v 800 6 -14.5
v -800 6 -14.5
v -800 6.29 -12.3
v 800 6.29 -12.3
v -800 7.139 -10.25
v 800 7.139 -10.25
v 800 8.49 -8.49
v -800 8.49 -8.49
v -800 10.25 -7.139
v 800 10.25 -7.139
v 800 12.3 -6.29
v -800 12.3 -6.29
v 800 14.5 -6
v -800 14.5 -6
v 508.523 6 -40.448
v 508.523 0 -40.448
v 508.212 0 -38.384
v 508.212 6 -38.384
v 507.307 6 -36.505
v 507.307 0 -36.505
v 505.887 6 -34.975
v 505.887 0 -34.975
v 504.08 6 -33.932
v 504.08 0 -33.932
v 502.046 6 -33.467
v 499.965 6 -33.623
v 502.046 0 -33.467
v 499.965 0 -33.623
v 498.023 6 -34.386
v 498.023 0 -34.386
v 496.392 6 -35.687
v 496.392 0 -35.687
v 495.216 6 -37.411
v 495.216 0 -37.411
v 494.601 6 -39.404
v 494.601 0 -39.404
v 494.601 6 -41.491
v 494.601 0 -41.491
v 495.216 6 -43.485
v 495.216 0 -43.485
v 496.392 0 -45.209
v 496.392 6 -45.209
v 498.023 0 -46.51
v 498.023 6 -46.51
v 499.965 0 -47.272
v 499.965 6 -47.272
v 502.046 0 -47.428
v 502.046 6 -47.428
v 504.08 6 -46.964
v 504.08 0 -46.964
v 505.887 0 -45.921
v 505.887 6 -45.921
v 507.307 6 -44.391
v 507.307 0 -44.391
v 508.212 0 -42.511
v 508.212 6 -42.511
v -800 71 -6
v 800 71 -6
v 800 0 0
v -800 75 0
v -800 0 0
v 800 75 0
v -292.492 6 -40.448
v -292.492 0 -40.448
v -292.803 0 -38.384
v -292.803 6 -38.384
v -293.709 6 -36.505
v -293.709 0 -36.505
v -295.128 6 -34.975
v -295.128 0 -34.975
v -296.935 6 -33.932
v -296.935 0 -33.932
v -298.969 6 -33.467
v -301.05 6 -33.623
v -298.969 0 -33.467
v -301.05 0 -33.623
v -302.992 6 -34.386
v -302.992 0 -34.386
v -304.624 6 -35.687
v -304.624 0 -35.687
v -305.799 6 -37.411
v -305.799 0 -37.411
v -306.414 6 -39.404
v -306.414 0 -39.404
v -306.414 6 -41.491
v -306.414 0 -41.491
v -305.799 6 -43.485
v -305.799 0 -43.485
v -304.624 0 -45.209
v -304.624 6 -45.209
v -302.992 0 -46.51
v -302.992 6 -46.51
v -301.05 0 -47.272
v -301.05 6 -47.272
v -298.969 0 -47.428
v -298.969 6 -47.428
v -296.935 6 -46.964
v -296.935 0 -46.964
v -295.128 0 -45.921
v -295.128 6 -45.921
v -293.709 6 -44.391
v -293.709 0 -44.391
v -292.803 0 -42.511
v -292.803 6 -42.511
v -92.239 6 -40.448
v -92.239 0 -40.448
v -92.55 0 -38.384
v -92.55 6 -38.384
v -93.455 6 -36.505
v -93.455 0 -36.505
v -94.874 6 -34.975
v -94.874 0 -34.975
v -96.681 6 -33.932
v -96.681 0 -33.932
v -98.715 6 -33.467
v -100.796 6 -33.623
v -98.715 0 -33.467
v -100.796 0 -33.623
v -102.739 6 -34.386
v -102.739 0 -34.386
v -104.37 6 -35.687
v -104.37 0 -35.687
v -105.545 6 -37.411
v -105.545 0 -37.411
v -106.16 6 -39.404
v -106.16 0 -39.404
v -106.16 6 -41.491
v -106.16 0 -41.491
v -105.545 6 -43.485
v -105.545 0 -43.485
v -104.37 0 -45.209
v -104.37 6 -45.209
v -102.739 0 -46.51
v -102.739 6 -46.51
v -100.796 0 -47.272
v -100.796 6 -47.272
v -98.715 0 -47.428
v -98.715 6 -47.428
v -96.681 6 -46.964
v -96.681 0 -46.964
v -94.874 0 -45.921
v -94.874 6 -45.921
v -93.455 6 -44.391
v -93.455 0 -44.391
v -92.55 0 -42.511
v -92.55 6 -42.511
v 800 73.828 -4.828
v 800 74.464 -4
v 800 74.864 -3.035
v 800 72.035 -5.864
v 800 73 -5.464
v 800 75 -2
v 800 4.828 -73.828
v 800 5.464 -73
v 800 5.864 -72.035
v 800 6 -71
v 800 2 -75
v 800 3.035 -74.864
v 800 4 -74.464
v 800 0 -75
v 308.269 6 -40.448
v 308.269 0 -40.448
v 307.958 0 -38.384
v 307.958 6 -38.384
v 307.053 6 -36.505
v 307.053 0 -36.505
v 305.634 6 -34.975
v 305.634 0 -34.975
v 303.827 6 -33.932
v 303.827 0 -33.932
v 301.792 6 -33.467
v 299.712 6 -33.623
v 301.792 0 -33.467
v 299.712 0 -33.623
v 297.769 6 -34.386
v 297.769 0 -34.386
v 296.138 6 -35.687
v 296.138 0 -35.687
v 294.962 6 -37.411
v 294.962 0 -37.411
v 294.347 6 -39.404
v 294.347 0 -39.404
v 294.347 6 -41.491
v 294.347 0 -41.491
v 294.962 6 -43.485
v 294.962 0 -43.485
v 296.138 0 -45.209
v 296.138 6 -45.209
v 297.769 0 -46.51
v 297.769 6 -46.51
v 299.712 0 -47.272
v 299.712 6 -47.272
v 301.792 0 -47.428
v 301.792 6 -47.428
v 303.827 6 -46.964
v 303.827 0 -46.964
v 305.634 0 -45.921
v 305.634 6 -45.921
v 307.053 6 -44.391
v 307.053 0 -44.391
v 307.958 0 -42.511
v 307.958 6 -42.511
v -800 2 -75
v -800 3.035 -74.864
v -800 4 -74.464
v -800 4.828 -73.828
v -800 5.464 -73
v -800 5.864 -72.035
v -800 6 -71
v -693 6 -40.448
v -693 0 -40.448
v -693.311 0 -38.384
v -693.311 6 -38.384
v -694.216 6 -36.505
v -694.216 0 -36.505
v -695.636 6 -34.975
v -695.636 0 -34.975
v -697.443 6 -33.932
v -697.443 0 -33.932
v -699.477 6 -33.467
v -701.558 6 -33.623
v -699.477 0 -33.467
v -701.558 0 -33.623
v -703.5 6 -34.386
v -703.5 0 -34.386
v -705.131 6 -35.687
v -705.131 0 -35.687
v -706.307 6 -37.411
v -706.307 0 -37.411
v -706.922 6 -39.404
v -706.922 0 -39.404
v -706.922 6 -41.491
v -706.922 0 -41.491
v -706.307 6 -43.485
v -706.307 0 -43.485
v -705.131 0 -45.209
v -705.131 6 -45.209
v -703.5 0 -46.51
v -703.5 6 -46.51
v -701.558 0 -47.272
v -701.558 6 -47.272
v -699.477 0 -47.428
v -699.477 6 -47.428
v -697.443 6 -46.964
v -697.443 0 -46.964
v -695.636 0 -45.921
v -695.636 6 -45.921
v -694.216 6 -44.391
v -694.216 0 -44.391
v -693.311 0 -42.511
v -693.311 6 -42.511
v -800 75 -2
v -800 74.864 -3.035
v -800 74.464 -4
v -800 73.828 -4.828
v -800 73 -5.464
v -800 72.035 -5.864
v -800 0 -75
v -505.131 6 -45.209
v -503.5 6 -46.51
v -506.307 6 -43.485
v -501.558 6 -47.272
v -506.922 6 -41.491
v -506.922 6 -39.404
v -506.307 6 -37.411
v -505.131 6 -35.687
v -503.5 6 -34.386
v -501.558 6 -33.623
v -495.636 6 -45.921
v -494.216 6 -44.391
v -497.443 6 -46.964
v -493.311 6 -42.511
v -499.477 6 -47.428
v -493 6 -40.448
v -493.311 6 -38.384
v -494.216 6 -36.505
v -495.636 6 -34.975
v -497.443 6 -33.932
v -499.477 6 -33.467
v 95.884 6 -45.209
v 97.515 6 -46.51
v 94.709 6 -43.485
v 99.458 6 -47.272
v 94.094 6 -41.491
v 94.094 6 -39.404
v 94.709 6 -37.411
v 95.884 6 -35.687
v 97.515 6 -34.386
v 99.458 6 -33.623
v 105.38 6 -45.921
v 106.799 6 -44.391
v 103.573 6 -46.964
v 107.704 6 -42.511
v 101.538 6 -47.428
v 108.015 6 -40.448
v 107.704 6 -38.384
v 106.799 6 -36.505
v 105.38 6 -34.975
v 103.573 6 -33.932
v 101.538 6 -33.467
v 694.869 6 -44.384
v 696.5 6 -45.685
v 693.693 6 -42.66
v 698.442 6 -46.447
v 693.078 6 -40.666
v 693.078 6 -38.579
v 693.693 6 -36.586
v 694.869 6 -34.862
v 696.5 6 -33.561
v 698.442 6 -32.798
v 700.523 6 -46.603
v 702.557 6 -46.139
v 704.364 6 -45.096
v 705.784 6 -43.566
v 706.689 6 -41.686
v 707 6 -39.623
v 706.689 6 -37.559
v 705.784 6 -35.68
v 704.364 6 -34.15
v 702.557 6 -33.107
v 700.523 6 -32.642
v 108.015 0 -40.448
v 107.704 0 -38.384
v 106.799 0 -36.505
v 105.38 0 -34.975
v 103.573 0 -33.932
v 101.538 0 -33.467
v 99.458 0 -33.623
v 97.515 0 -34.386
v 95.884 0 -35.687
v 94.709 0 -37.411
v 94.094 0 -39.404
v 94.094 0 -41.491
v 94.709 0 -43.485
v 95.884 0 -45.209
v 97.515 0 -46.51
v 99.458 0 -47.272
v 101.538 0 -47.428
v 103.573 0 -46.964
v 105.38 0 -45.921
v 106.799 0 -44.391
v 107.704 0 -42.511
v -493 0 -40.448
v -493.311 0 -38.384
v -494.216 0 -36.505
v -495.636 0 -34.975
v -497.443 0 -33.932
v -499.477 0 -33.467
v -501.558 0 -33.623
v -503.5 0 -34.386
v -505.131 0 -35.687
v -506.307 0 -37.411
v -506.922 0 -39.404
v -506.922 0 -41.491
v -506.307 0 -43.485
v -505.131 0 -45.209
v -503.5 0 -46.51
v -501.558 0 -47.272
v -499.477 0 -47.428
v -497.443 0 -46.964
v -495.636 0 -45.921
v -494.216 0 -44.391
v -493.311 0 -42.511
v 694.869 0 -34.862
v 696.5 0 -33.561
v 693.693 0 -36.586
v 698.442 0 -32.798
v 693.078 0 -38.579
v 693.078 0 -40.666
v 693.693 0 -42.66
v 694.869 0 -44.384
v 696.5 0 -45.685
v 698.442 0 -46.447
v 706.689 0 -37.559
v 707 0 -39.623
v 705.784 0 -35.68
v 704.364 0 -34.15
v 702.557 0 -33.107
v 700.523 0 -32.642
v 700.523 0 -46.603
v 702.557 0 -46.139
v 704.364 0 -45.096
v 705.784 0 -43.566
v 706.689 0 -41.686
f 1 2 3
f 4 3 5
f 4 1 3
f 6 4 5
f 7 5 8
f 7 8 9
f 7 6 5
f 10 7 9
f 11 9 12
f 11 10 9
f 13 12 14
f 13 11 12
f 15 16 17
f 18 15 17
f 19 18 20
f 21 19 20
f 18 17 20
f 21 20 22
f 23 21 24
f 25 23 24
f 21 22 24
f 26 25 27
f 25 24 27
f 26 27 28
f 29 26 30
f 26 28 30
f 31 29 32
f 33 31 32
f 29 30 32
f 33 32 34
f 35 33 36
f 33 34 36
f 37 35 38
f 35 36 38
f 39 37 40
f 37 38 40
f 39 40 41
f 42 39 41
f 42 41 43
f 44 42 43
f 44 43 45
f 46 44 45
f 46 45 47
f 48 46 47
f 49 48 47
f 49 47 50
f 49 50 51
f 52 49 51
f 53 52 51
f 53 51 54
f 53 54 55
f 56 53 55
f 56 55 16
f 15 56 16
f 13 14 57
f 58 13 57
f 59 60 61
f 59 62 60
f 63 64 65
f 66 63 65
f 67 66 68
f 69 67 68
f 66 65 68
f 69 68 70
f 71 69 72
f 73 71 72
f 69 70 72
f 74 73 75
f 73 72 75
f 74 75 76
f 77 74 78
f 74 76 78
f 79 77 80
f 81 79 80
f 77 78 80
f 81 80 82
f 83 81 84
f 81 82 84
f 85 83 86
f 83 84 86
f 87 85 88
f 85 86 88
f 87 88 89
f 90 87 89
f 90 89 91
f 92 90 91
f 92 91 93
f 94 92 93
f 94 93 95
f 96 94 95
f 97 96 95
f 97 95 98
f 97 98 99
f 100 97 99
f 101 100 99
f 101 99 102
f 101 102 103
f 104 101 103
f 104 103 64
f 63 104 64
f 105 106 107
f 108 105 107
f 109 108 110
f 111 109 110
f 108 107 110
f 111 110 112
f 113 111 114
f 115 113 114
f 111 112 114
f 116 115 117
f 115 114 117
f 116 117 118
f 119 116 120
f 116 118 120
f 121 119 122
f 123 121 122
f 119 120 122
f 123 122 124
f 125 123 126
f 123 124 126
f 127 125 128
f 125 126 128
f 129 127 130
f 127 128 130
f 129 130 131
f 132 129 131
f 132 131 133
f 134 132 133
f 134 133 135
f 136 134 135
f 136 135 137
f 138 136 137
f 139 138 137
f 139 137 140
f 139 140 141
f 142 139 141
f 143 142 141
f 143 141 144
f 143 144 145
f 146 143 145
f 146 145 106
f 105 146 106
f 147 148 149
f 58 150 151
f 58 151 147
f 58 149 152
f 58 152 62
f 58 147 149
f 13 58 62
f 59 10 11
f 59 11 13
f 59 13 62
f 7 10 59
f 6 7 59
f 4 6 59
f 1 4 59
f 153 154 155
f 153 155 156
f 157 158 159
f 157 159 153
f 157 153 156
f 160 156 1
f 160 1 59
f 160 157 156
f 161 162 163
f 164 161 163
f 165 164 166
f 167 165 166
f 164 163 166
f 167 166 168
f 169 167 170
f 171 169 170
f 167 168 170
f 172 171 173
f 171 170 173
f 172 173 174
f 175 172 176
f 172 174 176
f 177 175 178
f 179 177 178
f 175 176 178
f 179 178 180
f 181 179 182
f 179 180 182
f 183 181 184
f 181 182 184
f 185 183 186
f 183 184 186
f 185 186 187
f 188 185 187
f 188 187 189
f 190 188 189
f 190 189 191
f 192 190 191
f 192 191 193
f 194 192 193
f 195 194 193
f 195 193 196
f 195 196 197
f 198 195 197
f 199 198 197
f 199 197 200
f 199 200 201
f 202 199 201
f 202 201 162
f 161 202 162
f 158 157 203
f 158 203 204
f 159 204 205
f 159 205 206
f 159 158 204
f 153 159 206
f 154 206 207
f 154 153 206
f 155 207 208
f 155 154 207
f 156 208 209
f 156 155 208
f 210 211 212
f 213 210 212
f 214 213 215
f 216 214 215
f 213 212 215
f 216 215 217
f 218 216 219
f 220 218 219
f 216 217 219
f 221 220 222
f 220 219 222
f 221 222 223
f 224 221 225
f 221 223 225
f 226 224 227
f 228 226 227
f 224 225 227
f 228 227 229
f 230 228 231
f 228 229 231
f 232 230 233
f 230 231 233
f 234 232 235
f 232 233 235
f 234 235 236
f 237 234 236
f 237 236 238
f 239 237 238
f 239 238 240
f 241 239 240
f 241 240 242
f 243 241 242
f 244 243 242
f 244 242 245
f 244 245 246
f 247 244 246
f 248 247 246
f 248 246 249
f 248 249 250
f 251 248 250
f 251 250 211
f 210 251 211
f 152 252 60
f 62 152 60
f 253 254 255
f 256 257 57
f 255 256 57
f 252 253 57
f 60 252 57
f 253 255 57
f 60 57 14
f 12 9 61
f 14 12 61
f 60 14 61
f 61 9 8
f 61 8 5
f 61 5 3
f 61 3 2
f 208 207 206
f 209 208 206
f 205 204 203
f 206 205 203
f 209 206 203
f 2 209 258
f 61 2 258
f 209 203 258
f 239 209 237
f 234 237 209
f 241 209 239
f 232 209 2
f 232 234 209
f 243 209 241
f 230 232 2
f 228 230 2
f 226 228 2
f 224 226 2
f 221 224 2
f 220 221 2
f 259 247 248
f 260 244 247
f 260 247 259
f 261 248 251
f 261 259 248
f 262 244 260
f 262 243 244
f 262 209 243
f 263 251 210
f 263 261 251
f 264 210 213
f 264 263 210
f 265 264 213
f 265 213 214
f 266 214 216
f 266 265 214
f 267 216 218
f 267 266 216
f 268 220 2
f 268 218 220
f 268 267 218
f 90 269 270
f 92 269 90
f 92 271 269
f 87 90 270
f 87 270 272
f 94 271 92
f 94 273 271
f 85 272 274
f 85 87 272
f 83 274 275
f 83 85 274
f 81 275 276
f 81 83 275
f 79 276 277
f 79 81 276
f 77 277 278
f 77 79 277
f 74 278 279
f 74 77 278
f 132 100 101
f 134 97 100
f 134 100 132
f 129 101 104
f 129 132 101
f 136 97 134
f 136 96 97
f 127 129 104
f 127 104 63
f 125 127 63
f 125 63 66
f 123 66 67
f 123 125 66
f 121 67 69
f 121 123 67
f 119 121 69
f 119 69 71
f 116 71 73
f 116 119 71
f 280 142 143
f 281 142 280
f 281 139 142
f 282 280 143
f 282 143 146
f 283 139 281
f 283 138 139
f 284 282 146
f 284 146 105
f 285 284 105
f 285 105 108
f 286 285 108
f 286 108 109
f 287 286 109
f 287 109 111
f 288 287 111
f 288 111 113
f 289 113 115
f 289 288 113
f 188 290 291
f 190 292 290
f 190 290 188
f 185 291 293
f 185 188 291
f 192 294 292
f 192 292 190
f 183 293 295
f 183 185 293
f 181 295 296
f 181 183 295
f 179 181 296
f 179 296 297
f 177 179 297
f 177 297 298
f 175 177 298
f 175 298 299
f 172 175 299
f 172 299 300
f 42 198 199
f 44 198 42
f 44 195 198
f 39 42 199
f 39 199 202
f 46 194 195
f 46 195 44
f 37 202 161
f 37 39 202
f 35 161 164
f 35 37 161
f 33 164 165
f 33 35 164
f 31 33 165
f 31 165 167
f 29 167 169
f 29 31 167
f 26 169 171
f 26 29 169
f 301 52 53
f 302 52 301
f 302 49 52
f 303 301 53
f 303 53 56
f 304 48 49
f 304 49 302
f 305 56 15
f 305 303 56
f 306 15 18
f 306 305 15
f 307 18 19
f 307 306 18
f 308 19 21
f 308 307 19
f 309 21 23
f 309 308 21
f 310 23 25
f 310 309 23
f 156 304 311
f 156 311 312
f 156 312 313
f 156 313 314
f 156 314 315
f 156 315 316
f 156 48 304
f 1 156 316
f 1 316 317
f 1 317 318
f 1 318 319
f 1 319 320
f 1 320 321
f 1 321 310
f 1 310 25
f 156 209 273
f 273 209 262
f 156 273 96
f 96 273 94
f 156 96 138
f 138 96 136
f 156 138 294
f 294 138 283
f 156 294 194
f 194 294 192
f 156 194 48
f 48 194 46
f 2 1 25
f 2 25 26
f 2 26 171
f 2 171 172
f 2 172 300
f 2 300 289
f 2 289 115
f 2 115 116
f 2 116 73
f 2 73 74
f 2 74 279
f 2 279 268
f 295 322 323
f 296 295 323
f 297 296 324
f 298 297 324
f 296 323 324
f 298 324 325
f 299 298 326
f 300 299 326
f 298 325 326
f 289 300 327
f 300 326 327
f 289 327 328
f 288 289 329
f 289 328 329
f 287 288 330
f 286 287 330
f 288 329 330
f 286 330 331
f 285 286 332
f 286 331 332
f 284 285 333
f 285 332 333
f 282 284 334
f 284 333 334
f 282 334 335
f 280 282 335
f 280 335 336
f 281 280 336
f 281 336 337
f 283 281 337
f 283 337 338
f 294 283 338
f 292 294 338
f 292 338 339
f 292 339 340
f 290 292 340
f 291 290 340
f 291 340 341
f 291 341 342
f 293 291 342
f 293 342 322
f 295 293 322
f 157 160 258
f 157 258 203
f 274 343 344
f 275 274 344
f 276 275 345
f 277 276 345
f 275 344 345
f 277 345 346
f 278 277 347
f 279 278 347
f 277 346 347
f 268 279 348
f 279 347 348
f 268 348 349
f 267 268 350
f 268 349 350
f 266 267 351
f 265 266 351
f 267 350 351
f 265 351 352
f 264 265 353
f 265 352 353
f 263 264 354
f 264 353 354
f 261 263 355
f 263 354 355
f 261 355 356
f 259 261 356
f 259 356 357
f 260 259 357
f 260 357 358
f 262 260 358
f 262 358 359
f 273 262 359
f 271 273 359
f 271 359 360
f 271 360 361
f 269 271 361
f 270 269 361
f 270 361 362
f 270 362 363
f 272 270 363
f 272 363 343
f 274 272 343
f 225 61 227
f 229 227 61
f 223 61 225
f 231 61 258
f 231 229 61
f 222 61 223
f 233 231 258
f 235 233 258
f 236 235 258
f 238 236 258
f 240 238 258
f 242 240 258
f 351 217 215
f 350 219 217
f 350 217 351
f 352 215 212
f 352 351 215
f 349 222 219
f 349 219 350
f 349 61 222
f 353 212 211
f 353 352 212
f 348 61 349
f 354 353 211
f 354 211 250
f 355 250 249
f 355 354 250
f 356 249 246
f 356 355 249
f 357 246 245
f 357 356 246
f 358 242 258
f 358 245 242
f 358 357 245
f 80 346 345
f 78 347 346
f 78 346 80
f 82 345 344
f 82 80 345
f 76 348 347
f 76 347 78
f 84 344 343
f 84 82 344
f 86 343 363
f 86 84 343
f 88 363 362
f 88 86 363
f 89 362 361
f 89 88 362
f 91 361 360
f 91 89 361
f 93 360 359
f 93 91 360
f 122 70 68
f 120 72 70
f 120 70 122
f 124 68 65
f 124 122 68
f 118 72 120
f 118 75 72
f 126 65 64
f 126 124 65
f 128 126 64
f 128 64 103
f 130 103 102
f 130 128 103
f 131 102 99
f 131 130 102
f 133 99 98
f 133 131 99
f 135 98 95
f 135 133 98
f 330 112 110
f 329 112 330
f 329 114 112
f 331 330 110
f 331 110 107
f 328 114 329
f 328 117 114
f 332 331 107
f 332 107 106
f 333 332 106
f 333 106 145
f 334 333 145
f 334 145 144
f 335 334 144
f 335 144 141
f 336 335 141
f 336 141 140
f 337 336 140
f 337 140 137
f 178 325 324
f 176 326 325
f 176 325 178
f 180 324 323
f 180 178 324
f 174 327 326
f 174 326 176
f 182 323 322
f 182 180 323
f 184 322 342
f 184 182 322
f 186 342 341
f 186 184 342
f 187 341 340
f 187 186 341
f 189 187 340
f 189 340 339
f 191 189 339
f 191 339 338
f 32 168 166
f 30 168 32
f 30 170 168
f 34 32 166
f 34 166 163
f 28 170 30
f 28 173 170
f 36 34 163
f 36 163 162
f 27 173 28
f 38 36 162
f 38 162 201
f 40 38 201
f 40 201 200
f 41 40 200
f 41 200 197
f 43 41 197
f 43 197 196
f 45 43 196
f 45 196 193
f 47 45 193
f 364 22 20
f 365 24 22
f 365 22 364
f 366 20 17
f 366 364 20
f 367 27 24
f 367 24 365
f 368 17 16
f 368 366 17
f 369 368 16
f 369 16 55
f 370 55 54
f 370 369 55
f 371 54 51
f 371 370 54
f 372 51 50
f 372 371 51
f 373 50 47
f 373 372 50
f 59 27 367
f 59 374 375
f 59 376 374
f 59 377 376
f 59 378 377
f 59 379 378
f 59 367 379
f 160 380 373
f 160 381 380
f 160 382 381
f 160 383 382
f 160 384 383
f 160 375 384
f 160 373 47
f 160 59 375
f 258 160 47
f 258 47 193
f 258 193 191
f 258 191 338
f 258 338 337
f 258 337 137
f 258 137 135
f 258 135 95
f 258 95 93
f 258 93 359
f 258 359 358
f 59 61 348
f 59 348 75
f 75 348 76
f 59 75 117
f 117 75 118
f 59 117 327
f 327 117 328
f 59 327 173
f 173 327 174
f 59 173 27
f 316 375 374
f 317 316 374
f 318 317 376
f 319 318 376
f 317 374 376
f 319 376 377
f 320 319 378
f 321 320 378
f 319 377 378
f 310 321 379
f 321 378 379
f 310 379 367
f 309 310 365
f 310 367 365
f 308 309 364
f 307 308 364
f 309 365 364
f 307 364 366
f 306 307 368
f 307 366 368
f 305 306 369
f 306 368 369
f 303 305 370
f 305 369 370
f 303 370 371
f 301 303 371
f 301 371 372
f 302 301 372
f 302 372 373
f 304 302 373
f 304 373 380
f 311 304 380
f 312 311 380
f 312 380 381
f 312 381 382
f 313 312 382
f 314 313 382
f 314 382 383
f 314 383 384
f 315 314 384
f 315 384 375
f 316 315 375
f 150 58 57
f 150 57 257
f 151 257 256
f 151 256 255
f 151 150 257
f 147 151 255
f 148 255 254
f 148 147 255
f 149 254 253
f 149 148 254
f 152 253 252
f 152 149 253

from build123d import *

# Parameters (mm, degrees)
SKETCH005_R      = 7
EXTRUDE005_DEPTH = 10
EXTRUDE004_DEPTH = 800


with BuildPart() as extrude001:
    # Sketch005 (on Face1 of Extrude004) → Extrude005 (new body)
    with BuildSketch(Plane.XZ):
        with Locations((-700, -40.447773)):
            Circle(SKETCH005_R)
        with Locations((700, -39.622757)):
            Circle(SKETCH005_R)
        with Locations((-500, -40.447773)):
            Circle(SKETCH005_R)
        with Locations((-299.49234, -40.447773)):
            Circle(SKETCH005_R)
        with Locations((-99.23851, -40.447773)):
            Circle(SKETCH005_R)
        with Locations((101.01532, -40.447773)):
            Circle(SKETCH005_R)
        with Locations((301.26915, -40.447773)):
            Circle(SKETCH005_R)
        with Locations((501.52298, -40.447773)):
            Circle(SKETCH005_R)
    extrude(amount=-EXTRUDE005_DEPTH)


with BuildPart() as angle:
    # AngleSteel006 → Extrude004 (new body, symmetric)
    with BuildSketch(Plane(origin=(0, 20.5898499587, -20.5898499587), x_dir=(0, -1, 0), z_dir=(1, 0, 0))):
        with BuildLine():
            Line((20.5898499587, -20.5898499587), (20.5898499587, 54.4101500413))
            Line((20.5898499587, 54.4101500413), (18.5898499587, 54.4101500413))
            ThreePointArc((18.5898499587, 54.4101500413), (15.761422834, 53.238577166), (14.5898499587, 50.4101500413))
            Line((14.5898499587, 50.4101500413), (14.5898499587, -6.0898499587))
            ThreePointArc((14.5898499587, -6.0898499587), (12.1002575988, -12.1002575988), (6.0898499587, -14.5898499587))
            Line((6.0898499587, -14.5898499587), (-50.4101500413, -14.5898499587))
            ThreePointArc((-50.4101500413, -14.5898499587), (-53.238577166, -15.761422834), (-54.4101500413, -18.5898499587))
            Line((-54.4101500413, -18.5898499587), (-54.4101500413, -20.5898499587))
            Line((-54.4101500413, -20.5898499587), (20.5898499587, -20.5898499587))
        make_face()
    extrude(amount=EXTRUDE004_DEPTH, both=True)

    # Cut002: cut Extrude001
    add(extrude001.part, mode=Mode.SUBTRACT)


solid = angle.part
